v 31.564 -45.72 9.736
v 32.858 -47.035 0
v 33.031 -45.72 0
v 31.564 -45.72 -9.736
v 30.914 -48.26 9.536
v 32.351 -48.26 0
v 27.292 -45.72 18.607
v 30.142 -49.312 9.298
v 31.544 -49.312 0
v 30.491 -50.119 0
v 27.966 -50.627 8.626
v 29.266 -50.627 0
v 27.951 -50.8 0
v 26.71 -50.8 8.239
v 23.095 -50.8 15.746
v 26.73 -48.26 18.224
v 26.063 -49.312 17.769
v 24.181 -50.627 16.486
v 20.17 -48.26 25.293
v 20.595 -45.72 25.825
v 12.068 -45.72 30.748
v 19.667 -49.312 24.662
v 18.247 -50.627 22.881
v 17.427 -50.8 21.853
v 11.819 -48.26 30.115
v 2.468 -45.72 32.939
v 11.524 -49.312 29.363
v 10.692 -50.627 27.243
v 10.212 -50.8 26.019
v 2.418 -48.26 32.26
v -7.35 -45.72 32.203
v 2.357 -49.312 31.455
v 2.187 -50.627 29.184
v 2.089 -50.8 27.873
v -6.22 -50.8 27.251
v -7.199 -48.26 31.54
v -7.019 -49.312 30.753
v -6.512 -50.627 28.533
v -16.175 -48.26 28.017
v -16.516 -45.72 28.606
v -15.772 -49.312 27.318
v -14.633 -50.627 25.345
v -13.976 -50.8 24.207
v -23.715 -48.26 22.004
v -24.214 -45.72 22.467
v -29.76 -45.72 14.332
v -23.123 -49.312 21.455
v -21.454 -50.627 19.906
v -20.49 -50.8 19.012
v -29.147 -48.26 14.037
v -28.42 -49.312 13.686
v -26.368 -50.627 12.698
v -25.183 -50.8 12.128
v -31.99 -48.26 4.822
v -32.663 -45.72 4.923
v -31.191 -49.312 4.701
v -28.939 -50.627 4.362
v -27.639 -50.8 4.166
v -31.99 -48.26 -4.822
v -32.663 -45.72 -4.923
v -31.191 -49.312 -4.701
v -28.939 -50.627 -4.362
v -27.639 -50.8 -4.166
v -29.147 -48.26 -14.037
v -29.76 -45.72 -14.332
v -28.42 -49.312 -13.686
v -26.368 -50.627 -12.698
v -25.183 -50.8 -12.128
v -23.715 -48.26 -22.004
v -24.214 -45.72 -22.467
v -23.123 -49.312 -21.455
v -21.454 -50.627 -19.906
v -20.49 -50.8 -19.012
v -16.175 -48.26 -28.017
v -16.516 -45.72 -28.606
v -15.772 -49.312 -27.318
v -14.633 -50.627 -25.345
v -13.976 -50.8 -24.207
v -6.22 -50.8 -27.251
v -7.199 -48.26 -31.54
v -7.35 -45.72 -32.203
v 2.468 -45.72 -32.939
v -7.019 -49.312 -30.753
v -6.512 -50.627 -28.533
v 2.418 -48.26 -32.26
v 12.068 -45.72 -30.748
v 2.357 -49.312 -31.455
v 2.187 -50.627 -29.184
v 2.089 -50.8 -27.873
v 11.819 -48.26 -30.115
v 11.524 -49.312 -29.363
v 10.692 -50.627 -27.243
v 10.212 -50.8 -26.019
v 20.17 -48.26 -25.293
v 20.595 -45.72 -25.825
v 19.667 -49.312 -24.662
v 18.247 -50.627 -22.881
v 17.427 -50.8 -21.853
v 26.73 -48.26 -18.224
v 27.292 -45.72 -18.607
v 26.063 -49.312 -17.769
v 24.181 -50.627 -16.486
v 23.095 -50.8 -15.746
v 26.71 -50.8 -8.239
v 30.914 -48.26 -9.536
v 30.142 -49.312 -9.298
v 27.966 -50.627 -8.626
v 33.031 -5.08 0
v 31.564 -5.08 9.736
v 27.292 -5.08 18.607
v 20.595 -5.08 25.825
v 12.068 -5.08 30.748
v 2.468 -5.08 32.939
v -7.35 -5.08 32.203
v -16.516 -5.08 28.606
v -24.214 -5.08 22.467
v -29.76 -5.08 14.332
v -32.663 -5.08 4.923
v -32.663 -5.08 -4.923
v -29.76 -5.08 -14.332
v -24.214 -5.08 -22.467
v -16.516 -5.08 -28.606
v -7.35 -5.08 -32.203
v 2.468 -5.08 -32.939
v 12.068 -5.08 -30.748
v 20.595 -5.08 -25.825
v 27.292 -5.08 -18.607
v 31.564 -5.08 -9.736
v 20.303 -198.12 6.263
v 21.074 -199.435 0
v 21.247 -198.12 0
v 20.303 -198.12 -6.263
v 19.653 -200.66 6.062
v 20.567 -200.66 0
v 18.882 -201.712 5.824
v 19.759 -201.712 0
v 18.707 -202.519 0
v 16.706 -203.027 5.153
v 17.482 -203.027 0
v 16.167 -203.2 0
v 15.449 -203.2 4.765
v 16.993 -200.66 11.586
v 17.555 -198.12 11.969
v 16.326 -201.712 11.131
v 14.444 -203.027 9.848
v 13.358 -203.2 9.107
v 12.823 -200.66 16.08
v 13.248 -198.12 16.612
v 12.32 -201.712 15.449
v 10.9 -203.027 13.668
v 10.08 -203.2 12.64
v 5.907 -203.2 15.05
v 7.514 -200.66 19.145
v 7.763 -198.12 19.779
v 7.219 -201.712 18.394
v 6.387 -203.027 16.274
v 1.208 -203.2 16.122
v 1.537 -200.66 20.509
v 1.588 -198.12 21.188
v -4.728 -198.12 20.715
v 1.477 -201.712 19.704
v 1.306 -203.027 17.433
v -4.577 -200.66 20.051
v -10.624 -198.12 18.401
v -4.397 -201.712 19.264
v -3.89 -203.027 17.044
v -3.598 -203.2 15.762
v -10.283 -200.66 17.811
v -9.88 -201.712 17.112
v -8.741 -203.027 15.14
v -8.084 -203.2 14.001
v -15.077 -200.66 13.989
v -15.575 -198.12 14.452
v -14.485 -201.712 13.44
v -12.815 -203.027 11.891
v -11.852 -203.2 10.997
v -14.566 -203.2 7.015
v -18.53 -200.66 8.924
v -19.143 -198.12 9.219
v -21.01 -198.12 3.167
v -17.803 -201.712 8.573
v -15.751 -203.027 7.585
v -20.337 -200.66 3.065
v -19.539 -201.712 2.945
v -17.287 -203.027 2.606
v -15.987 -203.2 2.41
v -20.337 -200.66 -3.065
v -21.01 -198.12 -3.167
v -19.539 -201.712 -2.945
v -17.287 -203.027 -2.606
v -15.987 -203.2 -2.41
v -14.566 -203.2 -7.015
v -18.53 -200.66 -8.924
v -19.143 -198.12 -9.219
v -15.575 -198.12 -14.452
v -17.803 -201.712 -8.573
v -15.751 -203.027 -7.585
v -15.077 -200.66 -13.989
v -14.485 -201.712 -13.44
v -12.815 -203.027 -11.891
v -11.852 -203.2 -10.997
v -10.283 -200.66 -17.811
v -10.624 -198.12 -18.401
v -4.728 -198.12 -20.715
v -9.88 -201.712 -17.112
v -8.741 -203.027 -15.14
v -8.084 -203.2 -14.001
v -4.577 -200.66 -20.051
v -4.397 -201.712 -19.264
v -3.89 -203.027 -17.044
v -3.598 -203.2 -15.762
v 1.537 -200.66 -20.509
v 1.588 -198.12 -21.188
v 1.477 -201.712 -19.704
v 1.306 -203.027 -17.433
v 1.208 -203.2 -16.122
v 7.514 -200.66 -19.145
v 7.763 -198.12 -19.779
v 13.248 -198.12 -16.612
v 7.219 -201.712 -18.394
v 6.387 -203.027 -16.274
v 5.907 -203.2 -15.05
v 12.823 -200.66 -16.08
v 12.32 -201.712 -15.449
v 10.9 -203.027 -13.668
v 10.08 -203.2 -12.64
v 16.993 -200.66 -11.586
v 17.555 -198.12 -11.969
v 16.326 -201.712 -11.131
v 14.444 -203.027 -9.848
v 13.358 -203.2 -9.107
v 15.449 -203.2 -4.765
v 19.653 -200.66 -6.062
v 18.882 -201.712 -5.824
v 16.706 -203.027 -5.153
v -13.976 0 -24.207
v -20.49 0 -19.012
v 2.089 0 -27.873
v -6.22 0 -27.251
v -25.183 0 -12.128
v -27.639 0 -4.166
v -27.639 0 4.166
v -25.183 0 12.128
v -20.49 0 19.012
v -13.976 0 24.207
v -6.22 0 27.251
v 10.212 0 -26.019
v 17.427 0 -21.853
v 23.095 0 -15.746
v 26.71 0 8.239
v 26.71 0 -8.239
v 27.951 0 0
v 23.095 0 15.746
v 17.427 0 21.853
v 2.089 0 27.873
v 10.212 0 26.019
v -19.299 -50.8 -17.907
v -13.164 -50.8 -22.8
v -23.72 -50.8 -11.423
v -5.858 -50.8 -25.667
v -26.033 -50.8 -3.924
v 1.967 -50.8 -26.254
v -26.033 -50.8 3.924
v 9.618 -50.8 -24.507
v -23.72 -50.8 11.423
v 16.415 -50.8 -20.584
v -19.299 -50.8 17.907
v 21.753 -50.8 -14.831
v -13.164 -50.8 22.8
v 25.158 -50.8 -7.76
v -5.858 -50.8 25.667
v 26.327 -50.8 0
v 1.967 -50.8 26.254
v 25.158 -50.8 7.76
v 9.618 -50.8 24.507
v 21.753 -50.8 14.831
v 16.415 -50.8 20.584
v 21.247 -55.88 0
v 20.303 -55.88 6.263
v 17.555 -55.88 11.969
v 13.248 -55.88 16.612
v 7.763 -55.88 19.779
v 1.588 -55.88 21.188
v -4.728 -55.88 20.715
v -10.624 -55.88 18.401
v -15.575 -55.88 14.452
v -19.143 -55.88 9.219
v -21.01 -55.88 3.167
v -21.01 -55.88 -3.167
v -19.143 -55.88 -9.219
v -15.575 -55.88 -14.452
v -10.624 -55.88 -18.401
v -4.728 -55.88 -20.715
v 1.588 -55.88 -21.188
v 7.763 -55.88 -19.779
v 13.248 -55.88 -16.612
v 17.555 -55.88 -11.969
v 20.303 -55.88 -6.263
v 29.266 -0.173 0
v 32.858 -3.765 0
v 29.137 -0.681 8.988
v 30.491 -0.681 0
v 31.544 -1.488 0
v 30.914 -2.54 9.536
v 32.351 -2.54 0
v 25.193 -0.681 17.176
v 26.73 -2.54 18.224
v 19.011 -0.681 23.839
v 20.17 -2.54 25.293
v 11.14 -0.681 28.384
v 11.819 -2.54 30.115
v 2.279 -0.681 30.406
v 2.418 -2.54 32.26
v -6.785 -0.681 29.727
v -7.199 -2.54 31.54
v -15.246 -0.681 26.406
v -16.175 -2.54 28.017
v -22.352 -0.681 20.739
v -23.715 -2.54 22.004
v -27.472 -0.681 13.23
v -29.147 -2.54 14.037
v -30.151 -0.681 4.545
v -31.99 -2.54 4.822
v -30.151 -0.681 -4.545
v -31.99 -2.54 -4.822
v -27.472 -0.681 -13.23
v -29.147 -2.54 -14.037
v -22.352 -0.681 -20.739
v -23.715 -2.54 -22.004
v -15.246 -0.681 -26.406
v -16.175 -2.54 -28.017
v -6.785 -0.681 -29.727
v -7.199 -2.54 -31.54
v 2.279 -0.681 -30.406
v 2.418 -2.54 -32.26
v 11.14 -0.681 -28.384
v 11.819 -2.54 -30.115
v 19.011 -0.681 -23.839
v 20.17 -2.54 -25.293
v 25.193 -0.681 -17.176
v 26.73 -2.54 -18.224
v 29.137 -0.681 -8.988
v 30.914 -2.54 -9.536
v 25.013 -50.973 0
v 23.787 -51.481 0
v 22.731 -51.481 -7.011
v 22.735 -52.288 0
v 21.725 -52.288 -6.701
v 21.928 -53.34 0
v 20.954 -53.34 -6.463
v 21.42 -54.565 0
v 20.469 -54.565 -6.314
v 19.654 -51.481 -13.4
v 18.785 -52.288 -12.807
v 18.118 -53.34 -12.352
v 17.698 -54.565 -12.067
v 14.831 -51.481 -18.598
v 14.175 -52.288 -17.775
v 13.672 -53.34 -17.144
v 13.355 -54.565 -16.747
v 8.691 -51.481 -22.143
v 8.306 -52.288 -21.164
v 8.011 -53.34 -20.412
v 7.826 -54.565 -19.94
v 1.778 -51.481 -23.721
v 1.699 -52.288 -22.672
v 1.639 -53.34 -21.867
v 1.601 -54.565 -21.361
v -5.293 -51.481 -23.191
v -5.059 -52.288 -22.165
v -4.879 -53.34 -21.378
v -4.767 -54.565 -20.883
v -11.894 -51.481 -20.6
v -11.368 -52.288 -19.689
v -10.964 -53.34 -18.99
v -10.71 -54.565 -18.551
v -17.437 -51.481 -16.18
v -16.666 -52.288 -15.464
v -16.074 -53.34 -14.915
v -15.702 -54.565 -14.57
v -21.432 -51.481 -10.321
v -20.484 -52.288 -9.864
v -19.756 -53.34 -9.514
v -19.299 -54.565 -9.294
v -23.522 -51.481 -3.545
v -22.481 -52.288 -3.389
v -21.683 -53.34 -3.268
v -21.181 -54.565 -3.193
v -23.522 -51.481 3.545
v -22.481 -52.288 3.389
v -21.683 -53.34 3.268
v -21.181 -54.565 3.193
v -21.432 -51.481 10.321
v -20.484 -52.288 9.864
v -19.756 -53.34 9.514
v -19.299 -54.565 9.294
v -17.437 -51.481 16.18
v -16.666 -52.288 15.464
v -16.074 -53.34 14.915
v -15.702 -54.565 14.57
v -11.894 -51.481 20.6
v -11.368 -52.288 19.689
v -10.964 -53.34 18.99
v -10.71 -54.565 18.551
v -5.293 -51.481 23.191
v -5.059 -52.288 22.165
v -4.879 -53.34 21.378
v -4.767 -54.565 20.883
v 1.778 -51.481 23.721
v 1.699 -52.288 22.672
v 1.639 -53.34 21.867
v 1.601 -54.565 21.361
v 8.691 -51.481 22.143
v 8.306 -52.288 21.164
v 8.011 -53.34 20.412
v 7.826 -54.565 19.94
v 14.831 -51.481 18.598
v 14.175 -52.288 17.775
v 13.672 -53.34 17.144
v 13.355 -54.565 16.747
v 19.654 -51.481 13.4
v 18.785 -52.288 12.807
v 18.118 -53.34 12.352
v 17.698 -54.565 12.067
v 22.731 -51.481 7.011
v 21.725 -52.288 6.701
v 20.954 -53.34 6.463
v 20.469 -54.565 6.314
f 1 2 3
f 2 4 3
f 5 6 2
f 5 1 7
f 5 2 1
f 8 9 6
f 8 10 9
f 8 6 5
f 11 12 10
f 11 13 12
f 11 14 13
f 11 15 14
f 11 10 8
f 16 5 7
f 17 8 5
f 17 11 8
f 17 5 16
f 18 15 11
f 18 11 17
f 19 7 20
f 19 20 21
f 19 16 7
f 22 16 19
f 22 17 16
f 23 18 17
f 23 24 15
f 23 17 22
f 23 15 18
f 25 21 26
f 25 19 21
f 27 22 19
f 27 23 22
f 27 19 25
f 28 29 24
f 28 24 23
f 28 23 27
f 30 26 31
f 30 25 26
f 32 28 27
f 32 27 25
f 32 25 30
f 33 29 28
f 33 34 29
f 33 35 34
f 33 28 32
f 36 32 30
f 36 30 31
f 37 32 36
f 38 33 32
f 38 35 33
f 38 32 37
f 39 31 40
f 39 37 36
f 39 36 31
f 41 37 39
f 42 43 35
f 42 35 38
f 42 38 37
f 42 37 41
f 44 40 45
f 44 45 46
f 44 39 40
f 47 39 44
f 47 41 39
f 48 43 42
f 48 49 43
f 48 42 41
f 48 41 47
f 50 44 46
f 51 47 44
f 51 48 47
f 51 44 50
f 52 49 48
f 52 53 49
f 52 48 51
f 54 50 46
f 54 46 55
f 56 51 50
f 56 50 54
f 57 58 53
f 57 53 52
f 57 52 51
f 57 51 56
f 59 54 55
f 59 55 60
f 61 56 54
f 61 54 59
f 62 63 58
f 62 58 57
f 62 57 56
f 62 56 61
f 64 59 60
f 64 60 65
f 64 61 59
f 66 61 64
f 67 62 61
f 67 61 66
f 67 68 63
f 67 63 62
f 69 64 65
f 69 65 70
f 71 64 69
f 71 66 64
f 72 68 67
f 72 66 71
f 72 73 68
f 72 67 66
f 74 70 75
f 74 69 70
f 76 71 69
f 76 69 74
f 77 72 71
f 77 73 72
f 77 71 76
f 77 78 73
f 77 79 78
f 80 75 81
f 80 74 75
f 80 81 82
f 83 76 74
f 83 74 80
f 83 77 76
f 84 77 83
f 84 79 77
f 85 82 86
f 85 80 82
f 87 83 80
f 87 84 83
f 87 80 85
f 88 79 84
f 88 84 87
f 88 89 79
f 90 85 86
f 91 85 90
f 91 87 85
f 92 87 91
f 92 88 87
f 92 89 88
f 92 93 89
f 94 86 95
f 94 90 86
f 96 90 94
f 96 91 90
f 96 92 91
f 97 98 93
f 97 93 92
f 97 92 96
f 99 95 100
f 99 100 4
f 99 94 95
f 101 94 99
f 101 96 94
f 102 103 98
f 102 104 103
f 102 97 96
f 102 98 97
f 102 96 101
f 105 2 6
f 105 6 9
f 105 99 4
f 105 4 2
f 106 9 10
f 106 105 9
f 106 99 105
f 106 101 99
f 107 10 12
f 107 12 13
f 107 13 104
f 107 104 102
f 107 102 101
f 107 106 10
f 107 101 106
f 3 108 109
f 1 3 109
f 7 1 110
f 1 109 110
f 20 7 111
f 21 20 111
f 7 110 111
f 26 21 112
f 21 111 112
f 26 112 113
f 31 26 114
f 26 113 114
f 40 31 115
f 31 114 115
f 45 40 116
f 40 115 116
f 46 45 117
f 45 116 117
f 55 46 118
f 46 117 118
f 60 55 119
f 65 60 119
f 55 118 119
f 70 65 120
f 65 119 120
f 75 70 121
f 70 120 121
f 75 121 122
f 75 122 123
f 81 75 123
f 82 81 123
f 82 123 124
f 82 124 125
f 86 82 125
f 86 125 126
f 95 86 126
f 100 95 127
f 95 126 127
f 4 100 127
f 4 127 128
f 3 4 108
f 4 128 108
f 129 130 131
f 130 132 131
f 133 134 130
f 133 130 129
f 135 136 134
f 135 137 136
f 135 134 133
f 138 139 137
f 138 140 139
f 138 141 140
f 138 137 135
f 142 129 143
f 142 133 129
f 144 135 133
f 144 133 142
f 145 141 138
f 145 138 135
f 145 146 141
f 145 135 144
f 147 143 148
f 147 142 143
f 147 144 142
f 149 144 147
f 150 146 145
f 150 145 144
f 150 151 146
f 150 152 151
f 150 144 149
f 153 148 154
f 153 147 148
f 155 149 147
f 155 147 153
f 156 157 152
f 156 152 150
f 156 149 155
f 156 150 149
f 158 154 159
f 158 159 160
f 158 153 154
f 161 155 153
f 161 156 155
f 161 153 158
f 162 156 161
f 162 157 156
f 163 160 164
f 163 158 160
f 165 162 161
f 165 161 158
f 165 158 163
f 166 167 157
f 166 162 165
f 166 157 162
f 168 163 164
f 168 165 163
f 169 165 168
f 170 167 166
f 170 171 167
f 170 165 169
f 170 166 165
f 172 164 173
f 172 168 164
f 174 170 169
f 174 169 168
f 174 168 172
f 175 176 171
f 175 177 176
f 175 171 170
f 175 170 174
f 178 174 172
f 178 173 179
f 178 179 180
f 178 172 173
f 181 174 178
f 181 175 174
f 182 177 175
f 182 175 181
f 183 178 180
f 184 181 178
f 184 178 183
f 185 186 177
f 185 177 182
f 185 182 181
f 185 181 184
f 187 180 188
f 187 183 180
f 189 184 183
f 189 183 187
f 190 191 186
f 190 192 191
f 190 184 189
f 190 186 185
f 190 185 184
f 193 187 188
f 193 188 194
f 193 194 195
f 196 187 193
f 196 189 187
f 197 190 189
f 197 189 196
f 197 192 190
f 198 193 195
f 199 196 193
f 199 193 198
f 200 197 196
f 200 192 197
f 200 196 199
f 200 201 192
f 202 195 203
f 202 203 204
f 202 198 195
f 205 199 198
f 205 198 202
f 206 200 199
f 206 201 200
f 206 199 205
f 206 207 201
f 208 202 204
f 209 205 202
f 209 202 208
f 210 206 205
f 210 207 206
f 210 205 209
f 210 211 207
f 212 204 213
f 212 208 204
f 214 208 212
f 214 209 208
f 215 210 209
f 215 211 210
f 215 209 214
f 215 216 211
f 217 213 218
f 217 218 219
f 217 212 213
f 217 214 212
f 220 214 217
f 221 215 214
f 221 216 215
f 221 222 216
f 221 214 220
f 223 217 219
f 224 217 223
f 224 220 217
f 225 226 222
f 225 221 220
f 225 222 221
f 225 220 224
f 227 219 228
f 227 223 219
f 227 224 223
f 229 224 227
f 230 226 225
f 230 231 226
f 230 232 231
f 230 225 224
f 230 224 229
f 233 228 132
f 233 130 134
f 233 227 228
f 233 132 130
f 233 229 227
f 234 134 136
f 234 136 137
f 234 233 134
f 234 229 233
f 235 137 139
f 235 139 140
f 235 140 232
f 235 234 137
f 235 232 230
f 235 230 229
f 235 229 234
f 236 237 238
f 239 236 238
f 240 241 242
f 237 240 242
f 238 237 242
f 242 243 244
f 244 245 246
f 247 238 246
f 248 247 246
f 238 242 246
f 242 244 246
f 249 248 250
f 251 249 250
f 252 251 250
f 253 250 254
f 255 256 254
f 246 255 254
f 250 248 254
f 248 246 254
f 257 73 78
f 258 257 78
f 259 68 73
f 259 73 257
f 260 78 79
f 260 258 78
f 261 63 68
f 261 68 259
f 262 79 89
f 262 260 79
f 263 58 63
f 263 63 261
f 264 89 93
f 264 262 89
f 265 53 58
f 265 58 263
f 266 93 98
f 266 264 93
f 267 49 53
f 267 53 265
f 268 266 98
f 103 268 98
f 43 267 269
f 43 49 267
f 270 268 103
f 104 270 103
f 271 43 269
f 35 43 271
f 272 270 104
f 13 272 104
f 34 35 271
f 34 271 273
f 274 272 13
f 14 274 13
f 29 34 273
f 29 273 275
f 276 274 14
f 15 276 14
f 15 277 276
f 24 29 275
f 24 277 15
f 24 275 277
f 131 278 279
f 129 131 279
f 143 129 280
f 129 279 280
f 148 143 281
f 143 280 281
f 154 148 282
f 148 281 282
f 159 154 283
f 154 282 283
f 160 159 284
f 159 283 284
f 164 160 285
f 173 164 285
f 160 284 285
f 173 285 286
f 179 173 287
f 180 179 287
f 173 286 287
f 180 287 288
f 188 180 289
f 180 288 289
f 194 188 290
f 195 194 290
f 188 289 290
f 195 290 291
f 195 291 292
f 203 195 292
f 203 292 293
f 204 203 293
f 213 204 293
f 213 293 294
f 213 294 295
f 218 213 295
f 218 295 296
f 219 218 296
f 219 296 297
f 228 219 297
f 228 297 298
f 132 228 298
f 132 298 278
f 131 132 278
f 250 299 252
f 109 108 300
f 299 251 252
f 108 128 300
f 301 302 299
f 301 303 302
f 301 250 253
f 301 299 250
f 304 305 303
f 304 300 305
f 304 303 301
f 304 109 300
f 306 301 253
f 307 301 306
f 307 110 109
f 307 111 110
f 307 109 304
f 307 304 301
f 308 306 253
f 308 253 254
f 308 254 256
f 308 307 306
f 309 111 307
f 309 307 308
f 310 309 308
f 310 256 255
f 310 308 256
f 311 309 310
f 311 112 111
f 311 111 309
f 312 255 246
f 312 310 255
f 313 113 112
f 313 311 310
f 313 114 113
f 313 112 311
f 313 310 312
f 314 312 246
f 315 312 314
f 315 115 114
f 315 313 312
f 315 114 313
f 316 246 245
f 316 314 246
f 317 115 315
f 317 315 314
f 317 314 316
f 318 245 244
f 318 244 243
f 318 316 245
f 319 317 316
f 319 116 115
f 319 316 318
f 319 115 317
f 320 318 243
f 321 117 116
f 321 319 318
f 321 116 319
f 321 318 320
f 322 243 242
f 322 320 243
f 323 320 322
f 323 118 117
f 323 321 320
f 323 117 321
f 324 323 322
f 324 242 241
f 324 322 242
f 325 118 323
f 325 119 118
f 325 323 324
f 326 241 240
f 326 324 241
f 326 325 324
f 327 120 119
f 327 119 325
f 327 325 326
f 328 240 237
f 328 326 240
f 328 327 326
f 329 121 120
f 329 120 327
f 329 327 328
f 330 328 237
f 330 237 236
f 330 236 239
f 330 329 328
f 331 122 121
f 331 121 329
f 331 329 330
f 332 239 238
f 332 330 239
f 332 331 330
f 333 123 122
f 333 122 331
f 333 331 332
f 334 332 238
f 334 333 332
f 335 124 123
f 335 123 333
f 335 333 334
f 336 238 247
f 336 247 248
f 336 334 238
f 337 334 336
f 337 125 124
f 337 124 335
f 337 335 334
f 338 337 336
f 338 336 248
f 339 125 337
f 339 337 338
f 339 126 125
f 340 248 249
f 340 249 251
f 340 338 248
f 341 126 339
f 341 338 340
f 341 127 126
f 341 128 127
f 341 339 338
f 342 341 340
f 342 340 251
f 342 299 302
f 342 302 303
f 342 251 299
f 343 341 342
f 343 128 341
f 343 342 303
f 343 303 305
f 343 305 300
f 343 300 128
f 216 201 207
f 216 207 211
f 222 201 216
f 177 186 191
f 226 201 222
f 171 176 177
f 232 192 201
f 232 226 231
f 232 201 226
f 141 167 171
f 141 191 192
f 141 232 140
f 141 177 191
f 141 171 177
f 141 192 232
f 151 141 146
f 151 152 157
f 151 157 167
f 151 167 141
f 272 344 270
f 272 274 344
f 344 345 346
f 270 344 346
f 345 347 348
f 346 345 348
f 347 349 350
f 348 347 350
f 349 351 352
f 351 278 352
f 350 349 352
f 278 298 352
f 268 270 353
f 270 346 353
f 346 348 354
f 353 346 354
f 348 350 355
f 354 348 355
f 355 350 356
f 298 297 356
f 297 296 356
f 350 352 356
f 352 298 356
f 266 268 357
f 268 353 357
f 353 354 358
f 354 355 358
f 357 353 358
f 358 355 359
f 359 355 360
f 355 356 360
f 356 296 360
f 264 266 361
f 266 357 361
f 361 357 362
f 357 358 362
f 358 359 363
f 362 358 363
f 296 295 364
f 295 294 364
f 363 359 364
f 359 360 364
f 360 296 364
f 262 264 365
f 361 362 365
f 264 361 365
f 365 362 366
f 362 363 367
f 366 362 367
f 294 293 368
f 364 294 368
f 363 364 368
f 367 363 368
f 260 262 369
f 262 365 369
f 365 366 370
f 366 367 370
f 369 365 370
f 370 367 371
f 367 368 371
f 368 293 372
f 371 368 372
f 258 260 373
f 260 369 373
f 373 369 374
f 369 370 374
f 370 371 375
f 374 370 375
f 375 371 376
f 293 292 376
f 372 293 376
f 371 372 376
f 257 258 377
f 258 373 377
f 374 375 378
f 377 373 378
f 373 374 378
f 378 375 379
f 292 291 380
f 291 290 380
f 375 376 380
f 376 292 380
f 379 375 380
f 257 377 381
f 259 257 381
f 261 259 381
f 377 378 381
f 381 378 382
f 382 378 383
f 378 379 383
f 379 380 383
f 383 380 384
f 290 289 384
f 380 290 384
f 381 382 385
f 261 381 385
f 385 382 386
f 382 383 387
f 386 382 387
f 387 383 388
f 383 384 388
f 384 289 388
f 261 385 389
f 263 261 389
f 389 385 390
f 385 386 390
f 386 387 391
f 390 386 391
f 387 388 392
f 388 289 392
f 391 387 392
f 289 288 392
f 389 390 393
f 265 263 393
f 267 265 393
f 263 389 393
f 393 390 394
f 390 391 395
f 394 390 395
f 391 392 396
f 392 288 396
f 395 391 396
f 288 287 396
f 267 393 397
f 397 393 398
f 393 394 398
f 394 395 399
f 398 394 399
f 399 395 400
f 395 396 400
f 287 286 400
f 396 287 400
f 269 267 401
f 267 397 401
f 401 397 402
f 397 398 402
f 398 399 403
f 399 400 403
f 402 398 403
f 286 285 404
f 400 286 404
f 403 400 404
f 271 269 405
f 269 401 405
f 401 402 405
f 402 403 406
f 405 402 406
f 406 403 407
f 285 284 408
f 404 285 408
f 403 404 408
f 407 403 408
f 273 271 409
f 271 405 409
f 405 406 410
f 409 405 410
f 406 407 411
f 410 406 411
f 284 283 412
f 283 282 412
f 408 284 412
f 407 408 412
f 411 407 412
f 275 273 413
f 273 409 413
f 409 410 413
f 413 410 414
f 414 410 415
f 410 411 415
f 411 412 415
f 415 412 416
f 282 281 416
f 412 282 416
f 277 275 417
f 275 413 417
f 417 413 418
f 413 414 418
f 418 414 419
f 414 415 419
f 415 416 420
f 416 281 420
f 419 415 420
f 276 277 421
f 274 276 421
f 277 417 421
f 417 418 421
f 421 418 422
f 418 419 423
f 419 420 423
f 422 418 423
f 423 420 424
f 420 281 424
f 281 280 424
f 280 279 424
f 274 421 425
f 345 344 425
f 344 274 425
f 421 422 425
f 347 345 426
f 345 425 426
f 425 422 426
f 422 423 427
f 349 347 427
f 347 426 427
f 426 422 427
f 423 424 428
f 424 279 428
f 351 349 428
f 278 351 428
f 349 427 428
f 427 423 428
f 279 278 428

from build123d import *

# Parameters (mm, degrees)
F0_R     = 33.03147
F1_DEPTH = 50.8
F2_R     = 21.247393
F3_DEPTH = 203.2
F4_R     = 5.08
F5_R     = 5.08
F6_R     = 5.08


with BuildPart() as f1:
    # F0 (on Front) → F1 (new body)
    with BuildSketch(Plane.XZ):
        Circle(F0_R)
    extrude(amount=F1_DEPTH)

    # F2 (on Front) → F3 (join)
    with BuildSketch(Plane.XZ):
        Circle(F2_R)
    extrude(amount=F3_DEPTH)

    # F4
    f4_edges = [f1.edges().sort_by_distance(p)[0] for p in [
        (-33.03147, 0, 0),
    ]]
    fillet(f4_edges, radius=F4_R)

    # F5
    f5_edges = [f1.edges().sort_by_distance(p)[0] for p in [
        (-33.03147, -50.8, 0),
    ]]
    fillet(f5_edges, radius=F5_R)

    # F6
    f6_edges = [f1.edges().sort_by_distance(p)[0] for p in [
        (-21.247393, -50.8, 0),
        (-21.247393, -203.2, 0),
    ]]
    fillet(f6_edges, radius=F6_R)


solid = f1.part
